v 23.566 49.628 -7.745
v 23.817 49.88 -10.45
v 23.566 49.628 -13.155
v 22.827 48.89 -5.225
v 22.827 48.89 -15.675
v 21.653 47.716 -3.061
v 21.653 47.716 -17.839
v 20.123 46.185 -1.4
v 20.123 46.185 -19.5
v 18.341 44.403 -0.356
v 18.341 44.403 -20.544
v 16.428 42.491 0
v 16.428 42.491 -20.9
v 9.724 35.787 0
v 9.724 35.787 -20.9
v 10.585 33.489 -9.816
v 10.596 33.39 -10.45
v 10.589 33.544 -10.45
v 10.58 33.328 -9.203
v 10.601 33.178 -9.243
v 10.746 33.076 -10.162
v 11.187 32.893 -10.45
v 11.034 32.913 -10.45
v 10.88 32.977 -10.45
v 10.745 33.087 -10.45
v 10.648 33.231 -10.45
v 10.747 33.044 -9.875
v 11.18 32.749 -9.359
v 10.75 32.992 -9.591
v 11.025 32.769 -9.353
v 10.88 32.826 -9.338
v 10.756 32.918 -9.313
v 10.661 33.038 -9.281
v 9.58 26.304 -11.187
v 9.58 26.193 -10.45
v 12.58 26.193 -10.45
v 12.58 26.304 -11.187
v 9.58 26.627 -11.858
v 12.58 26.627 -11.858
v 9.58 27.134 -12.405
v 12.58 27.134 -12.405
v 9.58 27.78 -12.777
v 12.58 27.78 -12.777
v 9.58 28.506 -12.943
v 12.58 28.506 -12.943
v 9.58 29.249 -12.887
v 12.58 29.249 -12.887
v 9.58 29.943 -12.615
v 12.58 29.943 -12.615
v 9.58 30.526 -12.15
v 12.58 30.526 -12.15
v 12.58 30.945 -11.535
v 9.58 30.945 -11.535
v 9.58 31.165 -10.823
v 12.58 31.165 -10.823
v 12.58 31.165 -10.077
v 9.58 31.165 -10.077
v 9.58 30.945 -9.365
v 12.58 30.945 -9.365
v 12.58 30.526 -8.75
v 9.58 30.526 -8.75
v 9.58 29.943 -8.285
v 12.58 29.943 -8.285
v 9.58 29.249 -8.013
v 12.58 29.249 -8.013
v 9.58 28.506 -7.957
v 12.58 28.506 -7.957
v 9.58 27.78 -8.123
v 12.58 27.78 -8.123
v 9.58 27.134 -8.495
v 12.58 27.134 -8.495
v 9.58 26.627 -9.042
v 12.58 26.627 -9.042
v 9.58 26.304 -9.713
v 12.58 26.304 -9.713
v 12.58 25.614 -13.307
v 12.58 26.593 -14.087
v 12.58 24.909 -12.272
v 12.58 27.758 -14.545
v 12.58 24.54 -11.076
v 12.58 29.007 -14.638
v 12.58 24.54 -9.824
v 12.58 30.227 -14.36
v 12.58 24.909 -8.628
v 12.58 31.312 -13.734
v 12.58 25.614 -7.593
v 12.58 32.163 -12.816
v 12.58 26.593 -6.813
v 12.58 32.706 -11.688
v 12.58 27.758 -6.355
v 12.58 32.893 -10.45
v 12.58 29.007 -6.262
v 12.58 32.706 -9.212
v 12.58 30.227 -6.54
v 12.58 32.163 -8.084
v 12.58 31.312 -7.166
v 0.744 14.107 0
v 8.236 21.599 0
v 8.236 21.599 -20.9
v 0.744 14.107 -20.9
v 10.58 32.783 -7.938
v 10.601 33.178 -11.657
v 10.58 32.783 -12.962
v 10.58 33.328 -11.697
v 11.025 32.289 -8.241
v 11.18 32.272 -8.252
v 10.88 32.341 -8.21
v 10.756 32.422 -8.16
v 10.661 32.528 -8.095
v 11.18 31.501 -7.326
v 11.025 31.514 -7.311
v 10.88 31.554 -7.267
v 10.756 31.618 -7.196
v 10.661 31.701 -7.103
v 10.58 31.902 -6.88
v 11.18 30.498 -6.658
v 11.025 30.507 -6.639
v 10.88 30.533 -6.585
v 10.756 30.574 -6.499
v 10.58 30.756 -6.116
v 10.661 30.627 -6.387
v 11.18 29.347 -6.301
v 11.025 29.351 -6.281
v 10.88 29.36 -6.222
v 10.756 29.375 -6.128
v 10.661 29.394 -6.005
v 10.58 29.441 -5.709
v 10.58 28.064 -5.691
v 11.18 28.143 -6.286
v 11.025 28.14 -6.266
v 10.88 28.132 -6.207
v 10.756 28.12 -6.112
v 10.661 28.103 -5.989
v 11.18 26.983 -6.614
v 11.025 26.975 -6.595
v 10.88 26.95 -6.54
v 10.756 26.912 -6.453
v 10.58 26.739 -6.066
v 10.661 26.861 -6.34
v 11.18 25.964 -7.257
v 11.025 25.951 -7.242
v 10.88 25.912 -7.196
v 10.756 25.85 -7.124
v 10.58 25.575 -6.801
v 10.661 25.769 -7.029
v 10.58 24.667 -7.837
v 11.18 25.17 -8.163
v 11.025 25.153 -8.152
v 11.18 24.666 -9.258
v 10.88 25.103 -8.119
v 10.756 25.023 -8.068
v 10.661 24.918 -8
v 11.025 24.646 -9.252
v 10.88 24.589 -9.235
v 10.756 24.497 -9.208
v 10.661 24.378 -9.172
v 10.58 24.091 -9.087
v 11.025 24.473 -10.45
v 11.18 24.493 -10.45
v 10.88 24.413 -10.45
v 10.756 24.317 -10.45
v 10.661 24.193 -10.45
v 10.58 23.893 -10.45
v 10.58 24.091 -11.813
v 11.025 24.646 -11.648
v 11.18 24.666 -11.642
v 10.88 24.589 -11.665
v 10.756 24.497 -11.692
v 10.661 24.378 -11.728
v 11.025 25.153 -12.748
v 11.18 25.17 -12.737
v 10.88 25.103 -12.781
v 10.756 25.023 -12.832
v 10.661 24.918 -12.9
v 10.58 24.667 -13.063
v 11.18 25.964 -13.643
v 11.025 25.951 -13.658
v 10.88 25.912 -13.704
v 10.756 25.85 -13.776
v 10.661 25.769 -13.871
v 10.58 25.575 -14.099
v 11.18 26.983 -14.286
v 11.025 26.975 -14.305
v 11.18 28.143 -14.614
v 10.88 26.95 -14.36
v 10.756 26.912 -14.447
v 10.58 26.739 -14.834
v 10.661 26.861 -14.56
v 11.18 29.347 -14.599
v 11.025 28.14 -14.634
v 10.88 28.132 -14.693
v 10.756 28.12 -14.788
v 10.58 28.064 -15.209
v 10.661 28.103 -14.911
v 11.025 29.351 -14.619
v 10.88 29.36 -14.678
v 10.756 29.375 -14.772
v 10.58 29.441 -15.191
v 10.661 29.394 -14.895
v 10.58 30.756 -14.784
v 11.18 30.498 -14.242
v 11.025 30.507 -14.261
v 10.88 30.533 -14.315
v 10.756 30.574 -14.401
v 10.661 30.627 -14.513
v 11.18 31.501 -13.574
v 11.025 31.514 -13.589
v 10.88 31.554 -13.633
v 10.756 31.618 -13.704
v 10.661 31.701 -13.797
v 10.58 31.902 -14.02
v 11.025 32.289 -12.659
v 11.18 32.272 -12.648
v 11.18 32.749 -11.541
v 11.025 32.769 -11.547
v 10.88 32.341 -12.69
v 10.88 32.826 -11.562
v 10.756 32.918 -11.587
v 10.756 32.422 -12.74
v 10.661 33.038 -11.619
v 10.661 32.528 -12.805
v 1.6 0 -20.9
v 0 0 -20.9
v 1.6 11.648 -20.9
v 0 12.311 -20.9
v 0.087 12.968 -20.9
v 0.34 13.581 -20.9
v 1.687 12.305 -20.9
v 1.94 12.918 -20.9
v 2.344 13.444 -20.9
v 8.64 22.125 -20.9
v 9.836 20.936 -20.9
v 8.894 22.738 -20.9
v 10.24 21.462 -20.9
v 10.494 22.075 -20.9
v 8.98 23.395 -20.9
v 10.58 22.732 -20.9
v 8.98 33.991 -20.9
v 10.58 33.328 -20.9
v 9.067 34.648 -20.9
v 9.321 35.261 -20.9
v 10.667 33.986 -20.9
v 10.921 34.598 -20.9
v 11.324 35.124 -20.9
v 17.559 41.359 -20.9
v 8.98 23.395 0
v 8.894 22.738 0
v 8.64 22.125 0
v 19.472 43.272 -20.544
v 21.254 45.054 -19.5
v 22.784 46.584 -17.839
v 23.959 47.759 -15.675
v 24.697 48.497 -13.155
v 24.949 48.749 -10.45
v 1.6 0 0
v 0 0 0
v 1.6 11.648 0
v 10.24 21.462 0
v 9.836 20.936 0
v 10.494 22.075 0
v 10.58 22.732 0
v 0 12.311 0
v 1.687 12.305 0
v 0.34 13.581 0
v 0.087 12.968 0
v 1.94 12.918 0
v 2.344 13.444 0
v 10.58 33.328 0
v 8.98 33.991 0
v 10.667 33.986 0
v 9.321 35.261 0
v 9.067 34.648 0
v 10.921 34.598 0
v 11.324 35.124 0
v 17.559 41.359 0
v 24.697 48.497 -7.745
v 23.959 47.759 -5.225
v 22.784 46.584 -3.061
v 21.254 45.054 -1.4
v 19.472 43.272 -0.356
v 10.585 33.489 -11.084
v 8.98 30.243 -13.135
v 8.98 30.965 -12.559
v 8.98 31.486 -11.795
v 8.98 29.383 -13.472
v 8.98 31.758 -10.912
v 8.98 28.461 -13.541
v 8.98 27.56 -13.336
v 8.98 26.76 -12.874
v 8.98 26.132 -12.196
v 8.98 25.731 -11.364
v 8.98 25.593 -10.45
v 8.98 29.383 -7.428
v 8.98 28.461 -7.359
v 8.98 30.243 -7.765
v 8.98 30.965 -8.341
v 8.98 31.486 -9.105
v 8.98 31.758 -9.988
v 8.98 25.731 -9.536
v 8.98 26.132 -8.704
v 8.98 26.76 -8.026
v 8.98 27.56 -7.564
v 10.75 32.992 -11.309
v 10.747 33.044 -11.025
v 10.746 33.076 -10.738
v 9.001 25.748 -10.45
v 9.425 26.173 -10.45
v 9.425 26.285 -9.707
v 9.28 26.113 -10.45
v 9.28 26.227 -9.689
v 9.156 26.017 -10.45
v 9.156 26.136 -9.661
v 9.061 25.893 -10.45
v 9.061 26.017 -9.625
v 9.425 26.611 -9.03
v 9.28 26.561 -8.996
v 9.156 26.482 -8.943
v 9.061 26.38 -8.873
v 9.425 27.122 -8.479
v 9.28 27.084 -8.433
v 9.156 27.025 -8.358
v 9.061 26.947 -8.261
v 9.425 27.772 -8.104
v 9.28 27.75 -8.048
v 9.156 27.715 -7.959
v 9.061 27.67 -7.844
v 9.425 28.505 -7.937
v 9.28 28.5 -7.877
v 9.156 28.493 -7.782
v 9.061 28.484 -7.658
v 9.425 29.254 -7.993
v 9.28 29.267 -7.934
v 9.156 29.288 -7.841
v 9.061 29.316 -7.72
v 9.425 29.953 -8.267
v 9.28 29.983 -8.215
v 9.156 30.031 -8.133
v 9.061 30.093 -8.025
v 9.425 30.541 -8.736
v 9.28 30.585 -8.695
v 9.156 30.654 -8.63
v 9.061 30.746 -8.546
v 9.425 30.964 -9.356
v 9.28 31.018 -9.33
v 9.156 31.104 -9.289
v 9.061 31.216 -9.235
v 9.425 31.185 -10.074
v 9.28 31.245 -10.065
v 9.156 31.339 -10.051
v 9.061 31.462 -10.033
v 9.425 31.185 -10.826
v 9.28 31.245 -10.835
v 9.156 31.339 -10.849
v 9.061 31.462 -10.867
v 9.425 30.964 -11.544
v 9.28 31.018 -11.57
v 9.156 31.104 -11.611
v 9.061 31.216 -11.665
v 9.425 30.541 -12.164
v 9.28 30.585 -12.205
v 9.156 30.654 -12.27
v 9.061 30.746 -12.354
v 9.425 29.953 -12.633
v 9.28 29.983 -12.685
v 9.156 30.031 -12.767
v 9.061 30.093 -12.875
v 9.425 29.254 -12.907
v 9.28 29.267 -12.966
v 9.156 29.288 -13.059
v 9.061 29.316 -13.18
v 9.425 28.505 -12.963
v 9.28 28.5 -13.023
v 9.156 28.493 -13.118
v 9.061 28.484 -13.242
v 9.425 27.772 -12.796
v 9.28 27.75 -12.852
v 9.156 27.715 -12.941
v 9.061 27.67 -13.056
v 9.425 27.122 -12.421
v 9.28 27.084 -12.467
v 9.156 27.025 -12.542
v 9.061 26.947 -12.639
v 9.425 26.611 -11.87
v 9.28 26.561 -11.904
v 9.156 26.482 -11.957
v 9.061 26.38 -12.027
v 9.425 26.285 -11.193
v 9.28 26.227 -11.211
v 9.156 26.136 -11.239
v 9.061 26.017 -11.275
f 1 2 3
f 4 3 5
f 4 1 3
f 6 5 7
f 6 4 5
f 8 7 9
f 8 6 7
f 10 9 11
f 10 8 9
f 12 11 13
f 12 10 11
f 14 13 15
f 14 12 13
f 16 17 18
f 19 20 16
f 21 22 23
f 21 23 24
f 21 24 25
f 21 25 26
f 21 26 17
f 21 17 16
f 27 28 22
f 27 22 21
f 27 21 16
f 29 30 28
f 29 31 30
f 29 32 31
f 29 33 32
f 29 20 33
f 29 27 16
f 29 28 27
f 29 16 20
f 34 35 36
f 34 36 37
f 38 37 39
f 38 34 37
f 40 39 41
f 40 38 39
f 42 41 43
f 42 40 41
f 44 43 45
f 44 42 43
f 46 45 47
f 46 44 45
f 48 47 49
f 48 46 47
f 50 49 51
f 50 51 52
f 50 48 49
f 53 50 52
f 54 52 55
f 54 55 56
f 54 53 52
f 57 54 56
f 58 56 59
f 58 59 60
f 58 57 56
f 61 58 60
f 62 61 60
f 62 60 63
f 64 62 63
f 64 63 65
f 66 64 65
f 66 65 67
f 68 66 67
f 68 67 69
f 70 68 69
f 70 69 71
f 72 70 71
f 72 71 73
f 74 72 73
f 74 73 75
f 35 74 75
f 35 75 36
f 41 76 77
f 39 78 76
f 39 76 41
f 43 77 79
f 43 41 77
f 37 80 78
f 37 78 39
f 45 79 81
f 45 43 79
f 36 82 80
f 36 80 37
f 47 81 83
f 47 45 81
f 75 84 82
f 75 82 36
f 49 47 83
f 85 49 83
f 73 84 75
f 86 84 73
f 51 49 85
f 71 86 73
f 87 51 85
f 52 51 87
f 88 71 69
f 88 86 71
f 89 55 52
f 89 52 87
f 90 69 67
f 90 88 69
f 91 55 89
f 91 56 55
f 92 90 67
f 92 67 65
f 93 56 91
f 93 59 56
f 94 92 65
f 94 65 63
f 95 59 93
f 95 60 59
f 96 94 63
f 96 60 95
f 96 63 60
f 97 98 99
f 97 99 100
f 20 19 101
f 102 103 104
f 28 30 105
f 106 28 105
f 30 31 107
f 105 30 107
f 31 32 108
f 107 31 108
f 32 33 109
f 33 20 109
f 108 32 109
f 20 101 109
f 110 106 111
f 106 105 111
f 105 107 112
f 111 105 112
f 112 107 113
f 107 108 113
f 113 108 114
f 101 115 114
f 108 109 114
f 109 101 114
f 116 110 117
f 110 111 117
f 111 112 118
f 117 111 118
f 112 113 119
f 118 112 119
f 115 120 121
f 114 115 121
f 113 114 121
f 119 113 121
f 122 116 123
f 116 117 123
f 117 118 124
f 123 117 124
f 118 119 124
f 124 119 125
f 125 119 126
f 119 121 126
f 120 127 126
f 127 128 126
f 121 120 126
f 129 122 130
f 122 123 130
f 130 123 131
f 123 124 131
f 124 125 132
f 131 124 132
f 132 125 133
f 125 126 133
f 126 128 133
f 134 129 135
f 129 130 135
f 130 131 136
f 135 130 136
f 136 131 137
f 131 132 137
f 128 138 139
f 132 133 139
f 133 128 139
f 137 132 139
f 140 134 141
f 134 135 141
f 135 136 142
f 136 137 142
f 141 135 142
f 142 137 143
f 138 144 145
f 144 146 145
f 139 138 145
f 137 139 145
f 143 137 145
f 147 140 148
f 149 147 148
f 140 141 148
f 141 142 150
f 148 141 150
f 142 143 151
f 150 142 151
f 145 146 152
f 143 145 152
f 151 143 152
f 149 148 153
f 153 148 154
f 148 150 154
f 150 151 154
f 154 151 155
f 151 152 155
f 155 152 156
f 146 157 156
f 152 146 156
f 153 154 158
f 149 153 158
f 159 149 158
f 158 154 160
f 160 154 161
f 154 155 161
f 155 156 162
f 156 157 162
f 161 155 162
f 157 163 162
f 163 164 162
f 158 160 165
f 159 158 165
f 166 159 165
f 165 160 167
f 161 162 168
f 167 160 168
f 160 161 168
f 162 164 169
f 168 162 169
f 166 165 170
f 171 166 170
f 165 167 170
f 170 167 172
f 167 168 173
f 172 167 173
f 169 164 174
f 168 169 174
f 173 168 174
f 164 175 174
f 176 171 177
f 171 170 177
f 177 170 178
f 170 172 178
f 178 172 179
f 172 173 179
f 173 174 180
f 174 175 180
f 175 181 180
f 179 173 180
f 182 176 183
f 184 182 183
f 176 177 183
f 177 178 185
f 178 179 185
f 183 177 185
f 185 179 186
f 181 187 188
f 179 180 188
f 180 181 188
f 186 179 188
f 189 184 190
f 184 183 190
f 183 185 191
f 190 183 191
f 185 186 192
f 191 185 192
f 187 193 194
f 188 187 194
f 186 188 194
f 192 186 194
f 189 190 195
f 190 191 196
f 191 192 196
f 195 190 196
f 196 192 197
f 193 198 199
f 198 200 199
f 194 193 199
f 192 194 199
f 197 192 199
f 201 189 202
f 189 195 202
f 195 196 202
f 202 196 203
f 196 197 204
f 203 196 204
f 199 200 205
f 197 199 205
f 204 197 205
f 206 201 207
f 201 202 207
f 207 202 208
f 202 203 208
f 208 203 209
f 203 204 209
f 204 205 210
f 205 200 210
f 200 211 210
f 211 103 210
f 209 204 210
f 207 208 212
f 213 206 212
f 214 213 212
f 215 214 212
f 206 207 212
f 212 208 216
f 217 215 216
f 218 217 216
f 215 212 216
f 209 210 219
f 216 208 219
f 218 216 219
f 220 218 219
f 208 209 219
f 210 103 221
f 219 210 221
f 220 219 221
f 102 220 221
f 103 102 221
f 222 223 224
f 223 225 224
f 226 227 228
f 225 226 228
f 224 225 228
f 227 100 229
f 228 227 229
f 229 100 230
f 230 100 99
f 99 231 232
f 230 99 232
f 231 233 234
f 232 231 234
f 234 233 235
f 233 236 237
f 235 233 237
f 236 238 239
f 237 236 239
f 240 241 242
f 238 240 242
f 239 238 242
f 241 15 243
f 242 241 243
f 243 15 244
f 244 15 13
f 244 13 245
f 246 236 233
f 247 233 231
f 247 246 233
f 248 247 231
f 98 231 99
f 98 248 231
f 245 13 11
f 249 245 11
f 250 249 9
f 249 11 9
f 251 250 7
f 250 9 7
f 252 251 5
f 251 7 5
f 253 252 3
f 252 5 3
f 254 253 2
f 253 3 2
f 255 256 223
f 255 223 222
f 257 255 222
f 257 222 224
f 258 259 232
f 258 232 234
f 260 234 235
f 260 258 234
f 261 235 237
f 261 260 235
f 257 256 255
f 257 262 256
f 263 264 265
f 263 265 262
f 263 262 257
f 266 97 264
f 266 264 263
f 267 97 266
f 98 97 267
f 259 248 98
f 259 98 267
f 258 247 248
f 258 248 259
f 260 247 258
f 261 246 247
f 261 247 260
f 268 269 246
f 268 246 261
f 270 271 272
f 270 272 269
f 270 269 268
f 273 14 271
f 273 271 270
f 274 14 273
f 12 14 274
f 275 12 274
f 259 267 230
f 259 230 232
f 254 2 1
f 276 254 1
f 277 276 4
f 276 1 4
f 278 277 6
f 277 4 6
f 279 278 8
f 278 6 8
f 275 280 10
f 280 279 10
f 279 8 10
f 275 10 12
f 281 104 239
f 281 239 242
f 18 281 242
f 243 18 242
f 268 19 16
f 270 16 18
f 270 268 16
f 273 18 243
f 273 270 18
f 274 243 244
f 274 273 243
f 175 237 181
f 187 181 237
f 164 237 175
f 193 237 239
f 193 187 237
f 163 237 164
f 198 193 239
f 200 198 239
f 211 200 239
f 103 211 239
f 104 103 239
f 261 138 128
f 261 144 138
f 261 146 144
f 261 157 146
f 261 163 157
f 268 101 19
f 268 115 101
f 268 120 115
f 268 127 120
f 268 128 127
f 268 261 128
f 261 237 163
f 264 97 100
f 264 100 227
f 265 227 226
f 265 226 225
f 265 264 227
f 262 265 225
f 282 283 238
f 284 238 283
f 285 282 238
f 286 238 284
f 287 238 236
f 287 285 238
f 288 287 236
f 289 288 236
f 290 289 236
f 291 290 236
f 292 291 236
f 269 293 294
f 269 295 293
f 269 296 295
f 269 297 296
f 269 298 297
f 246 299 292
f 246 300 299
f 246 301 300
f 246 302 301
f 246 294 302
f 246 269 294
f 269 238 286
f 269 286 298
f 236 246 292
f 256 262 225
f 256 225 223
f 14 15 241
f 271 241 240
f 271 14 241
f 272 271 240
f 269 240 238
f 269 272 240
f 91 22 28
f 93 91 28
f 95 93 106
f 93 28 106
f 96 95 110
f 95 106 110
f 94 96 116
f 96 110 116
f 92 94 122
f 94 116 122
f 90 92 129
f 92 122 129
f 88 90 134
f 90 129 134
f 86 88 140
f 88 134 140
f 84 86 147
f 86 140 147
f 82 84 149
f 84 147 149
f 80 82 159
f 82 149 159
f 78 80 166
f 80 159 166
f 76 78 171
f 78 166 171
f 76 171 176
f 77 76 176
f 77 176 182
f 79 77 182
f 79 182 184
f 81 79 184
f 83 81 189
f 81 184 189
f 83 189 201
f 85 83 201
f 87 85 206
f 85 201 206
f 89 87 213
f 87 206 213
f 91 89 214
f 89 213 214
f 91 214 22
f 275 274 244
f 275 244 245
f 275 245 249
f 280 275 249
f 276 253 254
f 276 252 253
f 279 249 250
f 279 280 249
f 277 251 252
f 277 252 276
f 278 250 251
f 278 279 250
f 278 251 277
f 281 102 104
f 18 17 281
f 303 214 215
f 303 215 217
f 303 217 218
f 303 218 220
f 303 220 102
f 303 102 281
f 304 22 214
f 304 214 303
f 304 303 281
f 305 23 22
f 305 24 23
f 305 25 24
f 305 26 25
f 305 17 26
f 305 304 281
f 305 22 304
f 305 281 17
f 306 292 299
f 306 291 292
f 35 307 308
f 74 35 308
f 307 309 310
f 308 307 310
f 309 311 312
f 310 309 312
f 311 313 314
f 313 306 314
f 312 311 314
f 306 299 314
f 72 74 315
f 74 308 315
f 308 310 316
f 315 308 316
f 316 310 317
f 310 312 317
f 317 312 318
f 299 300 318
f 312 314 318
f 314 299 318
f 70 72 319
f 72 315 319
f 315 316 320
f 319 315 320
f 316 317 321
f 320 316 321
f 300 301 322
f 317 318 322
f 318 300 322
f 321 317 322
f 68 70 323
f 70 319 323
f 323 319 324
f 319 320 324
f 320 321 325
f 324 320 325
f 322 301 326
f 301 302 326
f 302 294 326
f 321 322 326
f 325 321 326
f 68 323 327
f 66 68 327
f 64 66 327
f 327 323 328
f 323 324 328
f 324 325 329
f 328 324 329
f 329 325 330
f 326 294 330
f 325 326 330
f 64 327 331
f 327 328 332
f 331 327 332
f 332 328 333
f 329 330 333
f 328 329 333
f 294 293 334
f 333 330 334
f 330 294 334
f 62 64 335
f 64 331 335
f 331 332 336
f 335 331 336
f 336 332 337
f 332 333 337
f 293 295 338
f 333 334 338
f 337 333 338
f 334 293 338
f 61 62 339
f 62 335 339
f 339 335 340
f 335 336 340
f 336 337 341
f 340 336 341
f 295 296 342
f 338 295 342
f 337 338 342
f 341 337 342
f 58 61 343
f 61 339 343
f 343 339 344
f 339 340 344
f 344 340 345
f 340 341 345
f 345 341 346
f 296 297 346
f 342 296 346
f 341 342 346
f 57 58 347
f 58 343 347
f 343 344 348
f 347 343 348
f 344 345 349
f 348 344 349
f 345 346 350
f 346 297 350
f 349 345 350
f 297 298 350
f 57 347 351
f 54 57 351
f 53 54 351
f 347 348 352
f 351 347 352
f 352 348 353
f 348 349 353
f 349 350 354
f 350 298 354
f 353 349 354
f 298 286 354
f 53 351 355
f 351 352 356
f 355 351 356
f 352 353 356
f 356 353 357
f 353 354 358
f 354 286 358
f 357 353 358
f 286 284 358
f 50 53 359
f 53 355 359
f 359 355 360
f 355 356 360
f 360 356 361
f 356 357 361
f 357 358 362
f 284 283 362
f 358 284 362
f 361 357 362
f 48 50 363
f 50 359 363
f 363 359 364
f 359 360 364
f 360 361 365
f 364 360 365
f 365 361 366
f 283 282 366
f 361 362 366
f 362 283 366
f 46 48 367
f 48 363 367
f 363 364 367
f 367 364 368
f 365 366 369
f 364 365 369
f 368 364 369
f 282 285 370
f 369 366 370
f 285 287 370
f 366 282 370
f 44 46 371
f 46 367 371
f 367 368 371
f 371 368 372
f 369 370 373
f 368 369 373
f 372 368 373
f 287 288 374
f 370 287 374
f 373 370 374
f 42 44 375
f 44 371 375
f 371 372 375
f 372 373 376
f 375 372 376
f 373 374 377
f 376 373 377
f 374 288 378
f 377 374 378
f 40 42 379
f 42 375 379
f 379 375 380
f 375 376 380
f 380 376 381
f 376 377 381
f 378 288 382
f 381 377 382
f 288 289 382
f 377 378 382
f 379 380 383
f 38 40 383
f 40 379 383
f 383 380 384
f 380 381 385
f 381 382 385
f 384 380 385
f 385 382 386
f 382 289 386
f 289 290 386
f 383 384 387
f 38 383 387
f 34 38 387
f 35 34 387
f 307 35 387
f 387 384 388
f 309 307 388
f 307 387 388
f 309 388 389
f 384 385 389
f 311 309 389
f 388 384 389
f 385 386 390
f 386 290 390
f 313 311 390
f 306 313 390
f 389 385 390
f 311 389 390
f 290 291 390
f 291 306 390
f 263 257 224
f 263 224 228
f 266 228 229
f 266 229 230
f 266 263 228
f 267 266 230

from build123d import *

# Parameters (mm, degrees)
BOSS_EXTRUDE1_DEPTH = 20.9
CUT_EXTRUDE1_DEPTH  = 57.895670946
SKETCH4_R           = 2.5
CUT_EXTRUDE2_DEPTH  = 57.389876565
SKETCH5_R           = 4.2
SKETCH5_R_2         = 2.5
BOSS_EXTRUDE2_DEPTH = 2
FILLET1_R           = 0.6


with BuildPart() as part:
    # Sketch1 → Boss-Extrude1 (new body)
    with BuildSketch(Plane.XY):
        with BuildLine():
            Line((1.6, 0), (1.6, 11.647897552))
            ThreePointArc((1.6, 11.647897552), (1.793345987, 12.61991347), (2.343948776, 13.443948776))
            Line((2.343948776, 13.443948776), (9.836307345, 20.936307345))
            ThreePointArc((9.836307345, 20.936307345), (10.386910134, 21.760342651), (10.580256121, 22.732358569))
            Line((10.580256121, 22.732358569), (10.580256121, 33.328153673))
            ThreePointArc((10.580256121, 33.328153673), (10.773602108, 34.300169591), (11.324204897, 35.124204897))
            Line((11.324204897, 35.124204897), (24.948665915, 48.748665915))
            Line((24.948665915, 48.748665915), (23.817295065, 49.880036765))
            Line((23.817295065, 49.880036765), (9.724204897, 35.786946597))
            ThreePointArc((9.724204897, 35.786946597), (9.173602108, 34.962911291), (8.980256121, 33.990895372))
            Line((8.980256121, 33.990895372), (8.980256121, 23.395100269))
            ThreePointArc((8.980256121, 23.395100269), (8.786910134, 22.423084351), (8.236307345, 21.599049045))
            Line((8.236307345, 21.599049045), (0.743948776, 14.106690476))
            ThreePointArc((0.743948776, 14.106690476), (0.193345987, 13.28265517), (0, 12.310639251))
            Line((0, 12.310639251), (0, 0))
            Line((0, 0), (1.6, 0))
        make_face()
    extrude(amount=-BOSS_EXTRUDE1_DEPTH)

    # Sketch3 → Cut-Extrude1 (cut, through all)
    with BuildSketch(Plane(origin=(-13.03137085, 13.03137085, 0), x_dir=(0, 0, 1), z_dir=(-0.7071067811865472, 0.7071067811865479, 0))):
        with BuildLine():
            ThreePointArc((-20.9, 41.661883092), (-17.839265863, 49.051148955), (-10.45, 52.111883092))
            Line((-10.45, 52.111883092), (-20.9, 52.111883092))
            Line((-20.9, 52.111883092), (-20.9, 41.661883092))
        make_face()
        with BuildLine():
            ThreePointArc((-10.45, 52.111883092), (-3.060734137, 49.051148955), (0, 41.661883092))
            Line((0, 41.661883092), (0, 52.111883092))
            Line((0, 52.111883092), (-10.45, 52.111883092))
        make_face()
    extrude(amount=-CUT_EXTRUDE1_DEPTH, mode=Mode.SUBTRACT)

    # Sketch4 → Cut-Extrude2 (cut, through all)
    with BuildSketch(Plane.ZY.offset(-8.980256121)):
        with Locations(Location((-10.45, 28.692997821, 0), (0, 0, 270))):
            Circle(SKETCH4_R)
    extrude(amount=-CUT_EXTRUDE2_DEPTH, mode=Mode.SUBTRACT)

    # Sketch5 → Boss-Extrude2 (add)
    with BuildSketch(Plane(origin=(10.580256121, 0, 0), x_dir=(0, 0, -1), z_dir=(1, 0, 0))):
        with Locations(Location((10.45, 28.692997821, 0), (0, 0, 90))):
            Circle(SKETCH5_R)
        with Locations(Location((10.45, 28.692997821, 0), (0, 0, 270))):
            Circle(SKETCH5_R_2, mode=Mode.SUBTRACT)
    extrude(amount=BOSS_EXTRUDE2_DEPTH)

    # Fillet1
    fillet1_edges = [part.edges().sort_by_distance(p)[0] for p in [
        (8.980256121, 31.192997821, -10.45),
        (10.580256121, 24.492997821, -10.45),
    ]]
    fillet(fillet1_edges, radius=FILLET1_R)


solid = part.part
